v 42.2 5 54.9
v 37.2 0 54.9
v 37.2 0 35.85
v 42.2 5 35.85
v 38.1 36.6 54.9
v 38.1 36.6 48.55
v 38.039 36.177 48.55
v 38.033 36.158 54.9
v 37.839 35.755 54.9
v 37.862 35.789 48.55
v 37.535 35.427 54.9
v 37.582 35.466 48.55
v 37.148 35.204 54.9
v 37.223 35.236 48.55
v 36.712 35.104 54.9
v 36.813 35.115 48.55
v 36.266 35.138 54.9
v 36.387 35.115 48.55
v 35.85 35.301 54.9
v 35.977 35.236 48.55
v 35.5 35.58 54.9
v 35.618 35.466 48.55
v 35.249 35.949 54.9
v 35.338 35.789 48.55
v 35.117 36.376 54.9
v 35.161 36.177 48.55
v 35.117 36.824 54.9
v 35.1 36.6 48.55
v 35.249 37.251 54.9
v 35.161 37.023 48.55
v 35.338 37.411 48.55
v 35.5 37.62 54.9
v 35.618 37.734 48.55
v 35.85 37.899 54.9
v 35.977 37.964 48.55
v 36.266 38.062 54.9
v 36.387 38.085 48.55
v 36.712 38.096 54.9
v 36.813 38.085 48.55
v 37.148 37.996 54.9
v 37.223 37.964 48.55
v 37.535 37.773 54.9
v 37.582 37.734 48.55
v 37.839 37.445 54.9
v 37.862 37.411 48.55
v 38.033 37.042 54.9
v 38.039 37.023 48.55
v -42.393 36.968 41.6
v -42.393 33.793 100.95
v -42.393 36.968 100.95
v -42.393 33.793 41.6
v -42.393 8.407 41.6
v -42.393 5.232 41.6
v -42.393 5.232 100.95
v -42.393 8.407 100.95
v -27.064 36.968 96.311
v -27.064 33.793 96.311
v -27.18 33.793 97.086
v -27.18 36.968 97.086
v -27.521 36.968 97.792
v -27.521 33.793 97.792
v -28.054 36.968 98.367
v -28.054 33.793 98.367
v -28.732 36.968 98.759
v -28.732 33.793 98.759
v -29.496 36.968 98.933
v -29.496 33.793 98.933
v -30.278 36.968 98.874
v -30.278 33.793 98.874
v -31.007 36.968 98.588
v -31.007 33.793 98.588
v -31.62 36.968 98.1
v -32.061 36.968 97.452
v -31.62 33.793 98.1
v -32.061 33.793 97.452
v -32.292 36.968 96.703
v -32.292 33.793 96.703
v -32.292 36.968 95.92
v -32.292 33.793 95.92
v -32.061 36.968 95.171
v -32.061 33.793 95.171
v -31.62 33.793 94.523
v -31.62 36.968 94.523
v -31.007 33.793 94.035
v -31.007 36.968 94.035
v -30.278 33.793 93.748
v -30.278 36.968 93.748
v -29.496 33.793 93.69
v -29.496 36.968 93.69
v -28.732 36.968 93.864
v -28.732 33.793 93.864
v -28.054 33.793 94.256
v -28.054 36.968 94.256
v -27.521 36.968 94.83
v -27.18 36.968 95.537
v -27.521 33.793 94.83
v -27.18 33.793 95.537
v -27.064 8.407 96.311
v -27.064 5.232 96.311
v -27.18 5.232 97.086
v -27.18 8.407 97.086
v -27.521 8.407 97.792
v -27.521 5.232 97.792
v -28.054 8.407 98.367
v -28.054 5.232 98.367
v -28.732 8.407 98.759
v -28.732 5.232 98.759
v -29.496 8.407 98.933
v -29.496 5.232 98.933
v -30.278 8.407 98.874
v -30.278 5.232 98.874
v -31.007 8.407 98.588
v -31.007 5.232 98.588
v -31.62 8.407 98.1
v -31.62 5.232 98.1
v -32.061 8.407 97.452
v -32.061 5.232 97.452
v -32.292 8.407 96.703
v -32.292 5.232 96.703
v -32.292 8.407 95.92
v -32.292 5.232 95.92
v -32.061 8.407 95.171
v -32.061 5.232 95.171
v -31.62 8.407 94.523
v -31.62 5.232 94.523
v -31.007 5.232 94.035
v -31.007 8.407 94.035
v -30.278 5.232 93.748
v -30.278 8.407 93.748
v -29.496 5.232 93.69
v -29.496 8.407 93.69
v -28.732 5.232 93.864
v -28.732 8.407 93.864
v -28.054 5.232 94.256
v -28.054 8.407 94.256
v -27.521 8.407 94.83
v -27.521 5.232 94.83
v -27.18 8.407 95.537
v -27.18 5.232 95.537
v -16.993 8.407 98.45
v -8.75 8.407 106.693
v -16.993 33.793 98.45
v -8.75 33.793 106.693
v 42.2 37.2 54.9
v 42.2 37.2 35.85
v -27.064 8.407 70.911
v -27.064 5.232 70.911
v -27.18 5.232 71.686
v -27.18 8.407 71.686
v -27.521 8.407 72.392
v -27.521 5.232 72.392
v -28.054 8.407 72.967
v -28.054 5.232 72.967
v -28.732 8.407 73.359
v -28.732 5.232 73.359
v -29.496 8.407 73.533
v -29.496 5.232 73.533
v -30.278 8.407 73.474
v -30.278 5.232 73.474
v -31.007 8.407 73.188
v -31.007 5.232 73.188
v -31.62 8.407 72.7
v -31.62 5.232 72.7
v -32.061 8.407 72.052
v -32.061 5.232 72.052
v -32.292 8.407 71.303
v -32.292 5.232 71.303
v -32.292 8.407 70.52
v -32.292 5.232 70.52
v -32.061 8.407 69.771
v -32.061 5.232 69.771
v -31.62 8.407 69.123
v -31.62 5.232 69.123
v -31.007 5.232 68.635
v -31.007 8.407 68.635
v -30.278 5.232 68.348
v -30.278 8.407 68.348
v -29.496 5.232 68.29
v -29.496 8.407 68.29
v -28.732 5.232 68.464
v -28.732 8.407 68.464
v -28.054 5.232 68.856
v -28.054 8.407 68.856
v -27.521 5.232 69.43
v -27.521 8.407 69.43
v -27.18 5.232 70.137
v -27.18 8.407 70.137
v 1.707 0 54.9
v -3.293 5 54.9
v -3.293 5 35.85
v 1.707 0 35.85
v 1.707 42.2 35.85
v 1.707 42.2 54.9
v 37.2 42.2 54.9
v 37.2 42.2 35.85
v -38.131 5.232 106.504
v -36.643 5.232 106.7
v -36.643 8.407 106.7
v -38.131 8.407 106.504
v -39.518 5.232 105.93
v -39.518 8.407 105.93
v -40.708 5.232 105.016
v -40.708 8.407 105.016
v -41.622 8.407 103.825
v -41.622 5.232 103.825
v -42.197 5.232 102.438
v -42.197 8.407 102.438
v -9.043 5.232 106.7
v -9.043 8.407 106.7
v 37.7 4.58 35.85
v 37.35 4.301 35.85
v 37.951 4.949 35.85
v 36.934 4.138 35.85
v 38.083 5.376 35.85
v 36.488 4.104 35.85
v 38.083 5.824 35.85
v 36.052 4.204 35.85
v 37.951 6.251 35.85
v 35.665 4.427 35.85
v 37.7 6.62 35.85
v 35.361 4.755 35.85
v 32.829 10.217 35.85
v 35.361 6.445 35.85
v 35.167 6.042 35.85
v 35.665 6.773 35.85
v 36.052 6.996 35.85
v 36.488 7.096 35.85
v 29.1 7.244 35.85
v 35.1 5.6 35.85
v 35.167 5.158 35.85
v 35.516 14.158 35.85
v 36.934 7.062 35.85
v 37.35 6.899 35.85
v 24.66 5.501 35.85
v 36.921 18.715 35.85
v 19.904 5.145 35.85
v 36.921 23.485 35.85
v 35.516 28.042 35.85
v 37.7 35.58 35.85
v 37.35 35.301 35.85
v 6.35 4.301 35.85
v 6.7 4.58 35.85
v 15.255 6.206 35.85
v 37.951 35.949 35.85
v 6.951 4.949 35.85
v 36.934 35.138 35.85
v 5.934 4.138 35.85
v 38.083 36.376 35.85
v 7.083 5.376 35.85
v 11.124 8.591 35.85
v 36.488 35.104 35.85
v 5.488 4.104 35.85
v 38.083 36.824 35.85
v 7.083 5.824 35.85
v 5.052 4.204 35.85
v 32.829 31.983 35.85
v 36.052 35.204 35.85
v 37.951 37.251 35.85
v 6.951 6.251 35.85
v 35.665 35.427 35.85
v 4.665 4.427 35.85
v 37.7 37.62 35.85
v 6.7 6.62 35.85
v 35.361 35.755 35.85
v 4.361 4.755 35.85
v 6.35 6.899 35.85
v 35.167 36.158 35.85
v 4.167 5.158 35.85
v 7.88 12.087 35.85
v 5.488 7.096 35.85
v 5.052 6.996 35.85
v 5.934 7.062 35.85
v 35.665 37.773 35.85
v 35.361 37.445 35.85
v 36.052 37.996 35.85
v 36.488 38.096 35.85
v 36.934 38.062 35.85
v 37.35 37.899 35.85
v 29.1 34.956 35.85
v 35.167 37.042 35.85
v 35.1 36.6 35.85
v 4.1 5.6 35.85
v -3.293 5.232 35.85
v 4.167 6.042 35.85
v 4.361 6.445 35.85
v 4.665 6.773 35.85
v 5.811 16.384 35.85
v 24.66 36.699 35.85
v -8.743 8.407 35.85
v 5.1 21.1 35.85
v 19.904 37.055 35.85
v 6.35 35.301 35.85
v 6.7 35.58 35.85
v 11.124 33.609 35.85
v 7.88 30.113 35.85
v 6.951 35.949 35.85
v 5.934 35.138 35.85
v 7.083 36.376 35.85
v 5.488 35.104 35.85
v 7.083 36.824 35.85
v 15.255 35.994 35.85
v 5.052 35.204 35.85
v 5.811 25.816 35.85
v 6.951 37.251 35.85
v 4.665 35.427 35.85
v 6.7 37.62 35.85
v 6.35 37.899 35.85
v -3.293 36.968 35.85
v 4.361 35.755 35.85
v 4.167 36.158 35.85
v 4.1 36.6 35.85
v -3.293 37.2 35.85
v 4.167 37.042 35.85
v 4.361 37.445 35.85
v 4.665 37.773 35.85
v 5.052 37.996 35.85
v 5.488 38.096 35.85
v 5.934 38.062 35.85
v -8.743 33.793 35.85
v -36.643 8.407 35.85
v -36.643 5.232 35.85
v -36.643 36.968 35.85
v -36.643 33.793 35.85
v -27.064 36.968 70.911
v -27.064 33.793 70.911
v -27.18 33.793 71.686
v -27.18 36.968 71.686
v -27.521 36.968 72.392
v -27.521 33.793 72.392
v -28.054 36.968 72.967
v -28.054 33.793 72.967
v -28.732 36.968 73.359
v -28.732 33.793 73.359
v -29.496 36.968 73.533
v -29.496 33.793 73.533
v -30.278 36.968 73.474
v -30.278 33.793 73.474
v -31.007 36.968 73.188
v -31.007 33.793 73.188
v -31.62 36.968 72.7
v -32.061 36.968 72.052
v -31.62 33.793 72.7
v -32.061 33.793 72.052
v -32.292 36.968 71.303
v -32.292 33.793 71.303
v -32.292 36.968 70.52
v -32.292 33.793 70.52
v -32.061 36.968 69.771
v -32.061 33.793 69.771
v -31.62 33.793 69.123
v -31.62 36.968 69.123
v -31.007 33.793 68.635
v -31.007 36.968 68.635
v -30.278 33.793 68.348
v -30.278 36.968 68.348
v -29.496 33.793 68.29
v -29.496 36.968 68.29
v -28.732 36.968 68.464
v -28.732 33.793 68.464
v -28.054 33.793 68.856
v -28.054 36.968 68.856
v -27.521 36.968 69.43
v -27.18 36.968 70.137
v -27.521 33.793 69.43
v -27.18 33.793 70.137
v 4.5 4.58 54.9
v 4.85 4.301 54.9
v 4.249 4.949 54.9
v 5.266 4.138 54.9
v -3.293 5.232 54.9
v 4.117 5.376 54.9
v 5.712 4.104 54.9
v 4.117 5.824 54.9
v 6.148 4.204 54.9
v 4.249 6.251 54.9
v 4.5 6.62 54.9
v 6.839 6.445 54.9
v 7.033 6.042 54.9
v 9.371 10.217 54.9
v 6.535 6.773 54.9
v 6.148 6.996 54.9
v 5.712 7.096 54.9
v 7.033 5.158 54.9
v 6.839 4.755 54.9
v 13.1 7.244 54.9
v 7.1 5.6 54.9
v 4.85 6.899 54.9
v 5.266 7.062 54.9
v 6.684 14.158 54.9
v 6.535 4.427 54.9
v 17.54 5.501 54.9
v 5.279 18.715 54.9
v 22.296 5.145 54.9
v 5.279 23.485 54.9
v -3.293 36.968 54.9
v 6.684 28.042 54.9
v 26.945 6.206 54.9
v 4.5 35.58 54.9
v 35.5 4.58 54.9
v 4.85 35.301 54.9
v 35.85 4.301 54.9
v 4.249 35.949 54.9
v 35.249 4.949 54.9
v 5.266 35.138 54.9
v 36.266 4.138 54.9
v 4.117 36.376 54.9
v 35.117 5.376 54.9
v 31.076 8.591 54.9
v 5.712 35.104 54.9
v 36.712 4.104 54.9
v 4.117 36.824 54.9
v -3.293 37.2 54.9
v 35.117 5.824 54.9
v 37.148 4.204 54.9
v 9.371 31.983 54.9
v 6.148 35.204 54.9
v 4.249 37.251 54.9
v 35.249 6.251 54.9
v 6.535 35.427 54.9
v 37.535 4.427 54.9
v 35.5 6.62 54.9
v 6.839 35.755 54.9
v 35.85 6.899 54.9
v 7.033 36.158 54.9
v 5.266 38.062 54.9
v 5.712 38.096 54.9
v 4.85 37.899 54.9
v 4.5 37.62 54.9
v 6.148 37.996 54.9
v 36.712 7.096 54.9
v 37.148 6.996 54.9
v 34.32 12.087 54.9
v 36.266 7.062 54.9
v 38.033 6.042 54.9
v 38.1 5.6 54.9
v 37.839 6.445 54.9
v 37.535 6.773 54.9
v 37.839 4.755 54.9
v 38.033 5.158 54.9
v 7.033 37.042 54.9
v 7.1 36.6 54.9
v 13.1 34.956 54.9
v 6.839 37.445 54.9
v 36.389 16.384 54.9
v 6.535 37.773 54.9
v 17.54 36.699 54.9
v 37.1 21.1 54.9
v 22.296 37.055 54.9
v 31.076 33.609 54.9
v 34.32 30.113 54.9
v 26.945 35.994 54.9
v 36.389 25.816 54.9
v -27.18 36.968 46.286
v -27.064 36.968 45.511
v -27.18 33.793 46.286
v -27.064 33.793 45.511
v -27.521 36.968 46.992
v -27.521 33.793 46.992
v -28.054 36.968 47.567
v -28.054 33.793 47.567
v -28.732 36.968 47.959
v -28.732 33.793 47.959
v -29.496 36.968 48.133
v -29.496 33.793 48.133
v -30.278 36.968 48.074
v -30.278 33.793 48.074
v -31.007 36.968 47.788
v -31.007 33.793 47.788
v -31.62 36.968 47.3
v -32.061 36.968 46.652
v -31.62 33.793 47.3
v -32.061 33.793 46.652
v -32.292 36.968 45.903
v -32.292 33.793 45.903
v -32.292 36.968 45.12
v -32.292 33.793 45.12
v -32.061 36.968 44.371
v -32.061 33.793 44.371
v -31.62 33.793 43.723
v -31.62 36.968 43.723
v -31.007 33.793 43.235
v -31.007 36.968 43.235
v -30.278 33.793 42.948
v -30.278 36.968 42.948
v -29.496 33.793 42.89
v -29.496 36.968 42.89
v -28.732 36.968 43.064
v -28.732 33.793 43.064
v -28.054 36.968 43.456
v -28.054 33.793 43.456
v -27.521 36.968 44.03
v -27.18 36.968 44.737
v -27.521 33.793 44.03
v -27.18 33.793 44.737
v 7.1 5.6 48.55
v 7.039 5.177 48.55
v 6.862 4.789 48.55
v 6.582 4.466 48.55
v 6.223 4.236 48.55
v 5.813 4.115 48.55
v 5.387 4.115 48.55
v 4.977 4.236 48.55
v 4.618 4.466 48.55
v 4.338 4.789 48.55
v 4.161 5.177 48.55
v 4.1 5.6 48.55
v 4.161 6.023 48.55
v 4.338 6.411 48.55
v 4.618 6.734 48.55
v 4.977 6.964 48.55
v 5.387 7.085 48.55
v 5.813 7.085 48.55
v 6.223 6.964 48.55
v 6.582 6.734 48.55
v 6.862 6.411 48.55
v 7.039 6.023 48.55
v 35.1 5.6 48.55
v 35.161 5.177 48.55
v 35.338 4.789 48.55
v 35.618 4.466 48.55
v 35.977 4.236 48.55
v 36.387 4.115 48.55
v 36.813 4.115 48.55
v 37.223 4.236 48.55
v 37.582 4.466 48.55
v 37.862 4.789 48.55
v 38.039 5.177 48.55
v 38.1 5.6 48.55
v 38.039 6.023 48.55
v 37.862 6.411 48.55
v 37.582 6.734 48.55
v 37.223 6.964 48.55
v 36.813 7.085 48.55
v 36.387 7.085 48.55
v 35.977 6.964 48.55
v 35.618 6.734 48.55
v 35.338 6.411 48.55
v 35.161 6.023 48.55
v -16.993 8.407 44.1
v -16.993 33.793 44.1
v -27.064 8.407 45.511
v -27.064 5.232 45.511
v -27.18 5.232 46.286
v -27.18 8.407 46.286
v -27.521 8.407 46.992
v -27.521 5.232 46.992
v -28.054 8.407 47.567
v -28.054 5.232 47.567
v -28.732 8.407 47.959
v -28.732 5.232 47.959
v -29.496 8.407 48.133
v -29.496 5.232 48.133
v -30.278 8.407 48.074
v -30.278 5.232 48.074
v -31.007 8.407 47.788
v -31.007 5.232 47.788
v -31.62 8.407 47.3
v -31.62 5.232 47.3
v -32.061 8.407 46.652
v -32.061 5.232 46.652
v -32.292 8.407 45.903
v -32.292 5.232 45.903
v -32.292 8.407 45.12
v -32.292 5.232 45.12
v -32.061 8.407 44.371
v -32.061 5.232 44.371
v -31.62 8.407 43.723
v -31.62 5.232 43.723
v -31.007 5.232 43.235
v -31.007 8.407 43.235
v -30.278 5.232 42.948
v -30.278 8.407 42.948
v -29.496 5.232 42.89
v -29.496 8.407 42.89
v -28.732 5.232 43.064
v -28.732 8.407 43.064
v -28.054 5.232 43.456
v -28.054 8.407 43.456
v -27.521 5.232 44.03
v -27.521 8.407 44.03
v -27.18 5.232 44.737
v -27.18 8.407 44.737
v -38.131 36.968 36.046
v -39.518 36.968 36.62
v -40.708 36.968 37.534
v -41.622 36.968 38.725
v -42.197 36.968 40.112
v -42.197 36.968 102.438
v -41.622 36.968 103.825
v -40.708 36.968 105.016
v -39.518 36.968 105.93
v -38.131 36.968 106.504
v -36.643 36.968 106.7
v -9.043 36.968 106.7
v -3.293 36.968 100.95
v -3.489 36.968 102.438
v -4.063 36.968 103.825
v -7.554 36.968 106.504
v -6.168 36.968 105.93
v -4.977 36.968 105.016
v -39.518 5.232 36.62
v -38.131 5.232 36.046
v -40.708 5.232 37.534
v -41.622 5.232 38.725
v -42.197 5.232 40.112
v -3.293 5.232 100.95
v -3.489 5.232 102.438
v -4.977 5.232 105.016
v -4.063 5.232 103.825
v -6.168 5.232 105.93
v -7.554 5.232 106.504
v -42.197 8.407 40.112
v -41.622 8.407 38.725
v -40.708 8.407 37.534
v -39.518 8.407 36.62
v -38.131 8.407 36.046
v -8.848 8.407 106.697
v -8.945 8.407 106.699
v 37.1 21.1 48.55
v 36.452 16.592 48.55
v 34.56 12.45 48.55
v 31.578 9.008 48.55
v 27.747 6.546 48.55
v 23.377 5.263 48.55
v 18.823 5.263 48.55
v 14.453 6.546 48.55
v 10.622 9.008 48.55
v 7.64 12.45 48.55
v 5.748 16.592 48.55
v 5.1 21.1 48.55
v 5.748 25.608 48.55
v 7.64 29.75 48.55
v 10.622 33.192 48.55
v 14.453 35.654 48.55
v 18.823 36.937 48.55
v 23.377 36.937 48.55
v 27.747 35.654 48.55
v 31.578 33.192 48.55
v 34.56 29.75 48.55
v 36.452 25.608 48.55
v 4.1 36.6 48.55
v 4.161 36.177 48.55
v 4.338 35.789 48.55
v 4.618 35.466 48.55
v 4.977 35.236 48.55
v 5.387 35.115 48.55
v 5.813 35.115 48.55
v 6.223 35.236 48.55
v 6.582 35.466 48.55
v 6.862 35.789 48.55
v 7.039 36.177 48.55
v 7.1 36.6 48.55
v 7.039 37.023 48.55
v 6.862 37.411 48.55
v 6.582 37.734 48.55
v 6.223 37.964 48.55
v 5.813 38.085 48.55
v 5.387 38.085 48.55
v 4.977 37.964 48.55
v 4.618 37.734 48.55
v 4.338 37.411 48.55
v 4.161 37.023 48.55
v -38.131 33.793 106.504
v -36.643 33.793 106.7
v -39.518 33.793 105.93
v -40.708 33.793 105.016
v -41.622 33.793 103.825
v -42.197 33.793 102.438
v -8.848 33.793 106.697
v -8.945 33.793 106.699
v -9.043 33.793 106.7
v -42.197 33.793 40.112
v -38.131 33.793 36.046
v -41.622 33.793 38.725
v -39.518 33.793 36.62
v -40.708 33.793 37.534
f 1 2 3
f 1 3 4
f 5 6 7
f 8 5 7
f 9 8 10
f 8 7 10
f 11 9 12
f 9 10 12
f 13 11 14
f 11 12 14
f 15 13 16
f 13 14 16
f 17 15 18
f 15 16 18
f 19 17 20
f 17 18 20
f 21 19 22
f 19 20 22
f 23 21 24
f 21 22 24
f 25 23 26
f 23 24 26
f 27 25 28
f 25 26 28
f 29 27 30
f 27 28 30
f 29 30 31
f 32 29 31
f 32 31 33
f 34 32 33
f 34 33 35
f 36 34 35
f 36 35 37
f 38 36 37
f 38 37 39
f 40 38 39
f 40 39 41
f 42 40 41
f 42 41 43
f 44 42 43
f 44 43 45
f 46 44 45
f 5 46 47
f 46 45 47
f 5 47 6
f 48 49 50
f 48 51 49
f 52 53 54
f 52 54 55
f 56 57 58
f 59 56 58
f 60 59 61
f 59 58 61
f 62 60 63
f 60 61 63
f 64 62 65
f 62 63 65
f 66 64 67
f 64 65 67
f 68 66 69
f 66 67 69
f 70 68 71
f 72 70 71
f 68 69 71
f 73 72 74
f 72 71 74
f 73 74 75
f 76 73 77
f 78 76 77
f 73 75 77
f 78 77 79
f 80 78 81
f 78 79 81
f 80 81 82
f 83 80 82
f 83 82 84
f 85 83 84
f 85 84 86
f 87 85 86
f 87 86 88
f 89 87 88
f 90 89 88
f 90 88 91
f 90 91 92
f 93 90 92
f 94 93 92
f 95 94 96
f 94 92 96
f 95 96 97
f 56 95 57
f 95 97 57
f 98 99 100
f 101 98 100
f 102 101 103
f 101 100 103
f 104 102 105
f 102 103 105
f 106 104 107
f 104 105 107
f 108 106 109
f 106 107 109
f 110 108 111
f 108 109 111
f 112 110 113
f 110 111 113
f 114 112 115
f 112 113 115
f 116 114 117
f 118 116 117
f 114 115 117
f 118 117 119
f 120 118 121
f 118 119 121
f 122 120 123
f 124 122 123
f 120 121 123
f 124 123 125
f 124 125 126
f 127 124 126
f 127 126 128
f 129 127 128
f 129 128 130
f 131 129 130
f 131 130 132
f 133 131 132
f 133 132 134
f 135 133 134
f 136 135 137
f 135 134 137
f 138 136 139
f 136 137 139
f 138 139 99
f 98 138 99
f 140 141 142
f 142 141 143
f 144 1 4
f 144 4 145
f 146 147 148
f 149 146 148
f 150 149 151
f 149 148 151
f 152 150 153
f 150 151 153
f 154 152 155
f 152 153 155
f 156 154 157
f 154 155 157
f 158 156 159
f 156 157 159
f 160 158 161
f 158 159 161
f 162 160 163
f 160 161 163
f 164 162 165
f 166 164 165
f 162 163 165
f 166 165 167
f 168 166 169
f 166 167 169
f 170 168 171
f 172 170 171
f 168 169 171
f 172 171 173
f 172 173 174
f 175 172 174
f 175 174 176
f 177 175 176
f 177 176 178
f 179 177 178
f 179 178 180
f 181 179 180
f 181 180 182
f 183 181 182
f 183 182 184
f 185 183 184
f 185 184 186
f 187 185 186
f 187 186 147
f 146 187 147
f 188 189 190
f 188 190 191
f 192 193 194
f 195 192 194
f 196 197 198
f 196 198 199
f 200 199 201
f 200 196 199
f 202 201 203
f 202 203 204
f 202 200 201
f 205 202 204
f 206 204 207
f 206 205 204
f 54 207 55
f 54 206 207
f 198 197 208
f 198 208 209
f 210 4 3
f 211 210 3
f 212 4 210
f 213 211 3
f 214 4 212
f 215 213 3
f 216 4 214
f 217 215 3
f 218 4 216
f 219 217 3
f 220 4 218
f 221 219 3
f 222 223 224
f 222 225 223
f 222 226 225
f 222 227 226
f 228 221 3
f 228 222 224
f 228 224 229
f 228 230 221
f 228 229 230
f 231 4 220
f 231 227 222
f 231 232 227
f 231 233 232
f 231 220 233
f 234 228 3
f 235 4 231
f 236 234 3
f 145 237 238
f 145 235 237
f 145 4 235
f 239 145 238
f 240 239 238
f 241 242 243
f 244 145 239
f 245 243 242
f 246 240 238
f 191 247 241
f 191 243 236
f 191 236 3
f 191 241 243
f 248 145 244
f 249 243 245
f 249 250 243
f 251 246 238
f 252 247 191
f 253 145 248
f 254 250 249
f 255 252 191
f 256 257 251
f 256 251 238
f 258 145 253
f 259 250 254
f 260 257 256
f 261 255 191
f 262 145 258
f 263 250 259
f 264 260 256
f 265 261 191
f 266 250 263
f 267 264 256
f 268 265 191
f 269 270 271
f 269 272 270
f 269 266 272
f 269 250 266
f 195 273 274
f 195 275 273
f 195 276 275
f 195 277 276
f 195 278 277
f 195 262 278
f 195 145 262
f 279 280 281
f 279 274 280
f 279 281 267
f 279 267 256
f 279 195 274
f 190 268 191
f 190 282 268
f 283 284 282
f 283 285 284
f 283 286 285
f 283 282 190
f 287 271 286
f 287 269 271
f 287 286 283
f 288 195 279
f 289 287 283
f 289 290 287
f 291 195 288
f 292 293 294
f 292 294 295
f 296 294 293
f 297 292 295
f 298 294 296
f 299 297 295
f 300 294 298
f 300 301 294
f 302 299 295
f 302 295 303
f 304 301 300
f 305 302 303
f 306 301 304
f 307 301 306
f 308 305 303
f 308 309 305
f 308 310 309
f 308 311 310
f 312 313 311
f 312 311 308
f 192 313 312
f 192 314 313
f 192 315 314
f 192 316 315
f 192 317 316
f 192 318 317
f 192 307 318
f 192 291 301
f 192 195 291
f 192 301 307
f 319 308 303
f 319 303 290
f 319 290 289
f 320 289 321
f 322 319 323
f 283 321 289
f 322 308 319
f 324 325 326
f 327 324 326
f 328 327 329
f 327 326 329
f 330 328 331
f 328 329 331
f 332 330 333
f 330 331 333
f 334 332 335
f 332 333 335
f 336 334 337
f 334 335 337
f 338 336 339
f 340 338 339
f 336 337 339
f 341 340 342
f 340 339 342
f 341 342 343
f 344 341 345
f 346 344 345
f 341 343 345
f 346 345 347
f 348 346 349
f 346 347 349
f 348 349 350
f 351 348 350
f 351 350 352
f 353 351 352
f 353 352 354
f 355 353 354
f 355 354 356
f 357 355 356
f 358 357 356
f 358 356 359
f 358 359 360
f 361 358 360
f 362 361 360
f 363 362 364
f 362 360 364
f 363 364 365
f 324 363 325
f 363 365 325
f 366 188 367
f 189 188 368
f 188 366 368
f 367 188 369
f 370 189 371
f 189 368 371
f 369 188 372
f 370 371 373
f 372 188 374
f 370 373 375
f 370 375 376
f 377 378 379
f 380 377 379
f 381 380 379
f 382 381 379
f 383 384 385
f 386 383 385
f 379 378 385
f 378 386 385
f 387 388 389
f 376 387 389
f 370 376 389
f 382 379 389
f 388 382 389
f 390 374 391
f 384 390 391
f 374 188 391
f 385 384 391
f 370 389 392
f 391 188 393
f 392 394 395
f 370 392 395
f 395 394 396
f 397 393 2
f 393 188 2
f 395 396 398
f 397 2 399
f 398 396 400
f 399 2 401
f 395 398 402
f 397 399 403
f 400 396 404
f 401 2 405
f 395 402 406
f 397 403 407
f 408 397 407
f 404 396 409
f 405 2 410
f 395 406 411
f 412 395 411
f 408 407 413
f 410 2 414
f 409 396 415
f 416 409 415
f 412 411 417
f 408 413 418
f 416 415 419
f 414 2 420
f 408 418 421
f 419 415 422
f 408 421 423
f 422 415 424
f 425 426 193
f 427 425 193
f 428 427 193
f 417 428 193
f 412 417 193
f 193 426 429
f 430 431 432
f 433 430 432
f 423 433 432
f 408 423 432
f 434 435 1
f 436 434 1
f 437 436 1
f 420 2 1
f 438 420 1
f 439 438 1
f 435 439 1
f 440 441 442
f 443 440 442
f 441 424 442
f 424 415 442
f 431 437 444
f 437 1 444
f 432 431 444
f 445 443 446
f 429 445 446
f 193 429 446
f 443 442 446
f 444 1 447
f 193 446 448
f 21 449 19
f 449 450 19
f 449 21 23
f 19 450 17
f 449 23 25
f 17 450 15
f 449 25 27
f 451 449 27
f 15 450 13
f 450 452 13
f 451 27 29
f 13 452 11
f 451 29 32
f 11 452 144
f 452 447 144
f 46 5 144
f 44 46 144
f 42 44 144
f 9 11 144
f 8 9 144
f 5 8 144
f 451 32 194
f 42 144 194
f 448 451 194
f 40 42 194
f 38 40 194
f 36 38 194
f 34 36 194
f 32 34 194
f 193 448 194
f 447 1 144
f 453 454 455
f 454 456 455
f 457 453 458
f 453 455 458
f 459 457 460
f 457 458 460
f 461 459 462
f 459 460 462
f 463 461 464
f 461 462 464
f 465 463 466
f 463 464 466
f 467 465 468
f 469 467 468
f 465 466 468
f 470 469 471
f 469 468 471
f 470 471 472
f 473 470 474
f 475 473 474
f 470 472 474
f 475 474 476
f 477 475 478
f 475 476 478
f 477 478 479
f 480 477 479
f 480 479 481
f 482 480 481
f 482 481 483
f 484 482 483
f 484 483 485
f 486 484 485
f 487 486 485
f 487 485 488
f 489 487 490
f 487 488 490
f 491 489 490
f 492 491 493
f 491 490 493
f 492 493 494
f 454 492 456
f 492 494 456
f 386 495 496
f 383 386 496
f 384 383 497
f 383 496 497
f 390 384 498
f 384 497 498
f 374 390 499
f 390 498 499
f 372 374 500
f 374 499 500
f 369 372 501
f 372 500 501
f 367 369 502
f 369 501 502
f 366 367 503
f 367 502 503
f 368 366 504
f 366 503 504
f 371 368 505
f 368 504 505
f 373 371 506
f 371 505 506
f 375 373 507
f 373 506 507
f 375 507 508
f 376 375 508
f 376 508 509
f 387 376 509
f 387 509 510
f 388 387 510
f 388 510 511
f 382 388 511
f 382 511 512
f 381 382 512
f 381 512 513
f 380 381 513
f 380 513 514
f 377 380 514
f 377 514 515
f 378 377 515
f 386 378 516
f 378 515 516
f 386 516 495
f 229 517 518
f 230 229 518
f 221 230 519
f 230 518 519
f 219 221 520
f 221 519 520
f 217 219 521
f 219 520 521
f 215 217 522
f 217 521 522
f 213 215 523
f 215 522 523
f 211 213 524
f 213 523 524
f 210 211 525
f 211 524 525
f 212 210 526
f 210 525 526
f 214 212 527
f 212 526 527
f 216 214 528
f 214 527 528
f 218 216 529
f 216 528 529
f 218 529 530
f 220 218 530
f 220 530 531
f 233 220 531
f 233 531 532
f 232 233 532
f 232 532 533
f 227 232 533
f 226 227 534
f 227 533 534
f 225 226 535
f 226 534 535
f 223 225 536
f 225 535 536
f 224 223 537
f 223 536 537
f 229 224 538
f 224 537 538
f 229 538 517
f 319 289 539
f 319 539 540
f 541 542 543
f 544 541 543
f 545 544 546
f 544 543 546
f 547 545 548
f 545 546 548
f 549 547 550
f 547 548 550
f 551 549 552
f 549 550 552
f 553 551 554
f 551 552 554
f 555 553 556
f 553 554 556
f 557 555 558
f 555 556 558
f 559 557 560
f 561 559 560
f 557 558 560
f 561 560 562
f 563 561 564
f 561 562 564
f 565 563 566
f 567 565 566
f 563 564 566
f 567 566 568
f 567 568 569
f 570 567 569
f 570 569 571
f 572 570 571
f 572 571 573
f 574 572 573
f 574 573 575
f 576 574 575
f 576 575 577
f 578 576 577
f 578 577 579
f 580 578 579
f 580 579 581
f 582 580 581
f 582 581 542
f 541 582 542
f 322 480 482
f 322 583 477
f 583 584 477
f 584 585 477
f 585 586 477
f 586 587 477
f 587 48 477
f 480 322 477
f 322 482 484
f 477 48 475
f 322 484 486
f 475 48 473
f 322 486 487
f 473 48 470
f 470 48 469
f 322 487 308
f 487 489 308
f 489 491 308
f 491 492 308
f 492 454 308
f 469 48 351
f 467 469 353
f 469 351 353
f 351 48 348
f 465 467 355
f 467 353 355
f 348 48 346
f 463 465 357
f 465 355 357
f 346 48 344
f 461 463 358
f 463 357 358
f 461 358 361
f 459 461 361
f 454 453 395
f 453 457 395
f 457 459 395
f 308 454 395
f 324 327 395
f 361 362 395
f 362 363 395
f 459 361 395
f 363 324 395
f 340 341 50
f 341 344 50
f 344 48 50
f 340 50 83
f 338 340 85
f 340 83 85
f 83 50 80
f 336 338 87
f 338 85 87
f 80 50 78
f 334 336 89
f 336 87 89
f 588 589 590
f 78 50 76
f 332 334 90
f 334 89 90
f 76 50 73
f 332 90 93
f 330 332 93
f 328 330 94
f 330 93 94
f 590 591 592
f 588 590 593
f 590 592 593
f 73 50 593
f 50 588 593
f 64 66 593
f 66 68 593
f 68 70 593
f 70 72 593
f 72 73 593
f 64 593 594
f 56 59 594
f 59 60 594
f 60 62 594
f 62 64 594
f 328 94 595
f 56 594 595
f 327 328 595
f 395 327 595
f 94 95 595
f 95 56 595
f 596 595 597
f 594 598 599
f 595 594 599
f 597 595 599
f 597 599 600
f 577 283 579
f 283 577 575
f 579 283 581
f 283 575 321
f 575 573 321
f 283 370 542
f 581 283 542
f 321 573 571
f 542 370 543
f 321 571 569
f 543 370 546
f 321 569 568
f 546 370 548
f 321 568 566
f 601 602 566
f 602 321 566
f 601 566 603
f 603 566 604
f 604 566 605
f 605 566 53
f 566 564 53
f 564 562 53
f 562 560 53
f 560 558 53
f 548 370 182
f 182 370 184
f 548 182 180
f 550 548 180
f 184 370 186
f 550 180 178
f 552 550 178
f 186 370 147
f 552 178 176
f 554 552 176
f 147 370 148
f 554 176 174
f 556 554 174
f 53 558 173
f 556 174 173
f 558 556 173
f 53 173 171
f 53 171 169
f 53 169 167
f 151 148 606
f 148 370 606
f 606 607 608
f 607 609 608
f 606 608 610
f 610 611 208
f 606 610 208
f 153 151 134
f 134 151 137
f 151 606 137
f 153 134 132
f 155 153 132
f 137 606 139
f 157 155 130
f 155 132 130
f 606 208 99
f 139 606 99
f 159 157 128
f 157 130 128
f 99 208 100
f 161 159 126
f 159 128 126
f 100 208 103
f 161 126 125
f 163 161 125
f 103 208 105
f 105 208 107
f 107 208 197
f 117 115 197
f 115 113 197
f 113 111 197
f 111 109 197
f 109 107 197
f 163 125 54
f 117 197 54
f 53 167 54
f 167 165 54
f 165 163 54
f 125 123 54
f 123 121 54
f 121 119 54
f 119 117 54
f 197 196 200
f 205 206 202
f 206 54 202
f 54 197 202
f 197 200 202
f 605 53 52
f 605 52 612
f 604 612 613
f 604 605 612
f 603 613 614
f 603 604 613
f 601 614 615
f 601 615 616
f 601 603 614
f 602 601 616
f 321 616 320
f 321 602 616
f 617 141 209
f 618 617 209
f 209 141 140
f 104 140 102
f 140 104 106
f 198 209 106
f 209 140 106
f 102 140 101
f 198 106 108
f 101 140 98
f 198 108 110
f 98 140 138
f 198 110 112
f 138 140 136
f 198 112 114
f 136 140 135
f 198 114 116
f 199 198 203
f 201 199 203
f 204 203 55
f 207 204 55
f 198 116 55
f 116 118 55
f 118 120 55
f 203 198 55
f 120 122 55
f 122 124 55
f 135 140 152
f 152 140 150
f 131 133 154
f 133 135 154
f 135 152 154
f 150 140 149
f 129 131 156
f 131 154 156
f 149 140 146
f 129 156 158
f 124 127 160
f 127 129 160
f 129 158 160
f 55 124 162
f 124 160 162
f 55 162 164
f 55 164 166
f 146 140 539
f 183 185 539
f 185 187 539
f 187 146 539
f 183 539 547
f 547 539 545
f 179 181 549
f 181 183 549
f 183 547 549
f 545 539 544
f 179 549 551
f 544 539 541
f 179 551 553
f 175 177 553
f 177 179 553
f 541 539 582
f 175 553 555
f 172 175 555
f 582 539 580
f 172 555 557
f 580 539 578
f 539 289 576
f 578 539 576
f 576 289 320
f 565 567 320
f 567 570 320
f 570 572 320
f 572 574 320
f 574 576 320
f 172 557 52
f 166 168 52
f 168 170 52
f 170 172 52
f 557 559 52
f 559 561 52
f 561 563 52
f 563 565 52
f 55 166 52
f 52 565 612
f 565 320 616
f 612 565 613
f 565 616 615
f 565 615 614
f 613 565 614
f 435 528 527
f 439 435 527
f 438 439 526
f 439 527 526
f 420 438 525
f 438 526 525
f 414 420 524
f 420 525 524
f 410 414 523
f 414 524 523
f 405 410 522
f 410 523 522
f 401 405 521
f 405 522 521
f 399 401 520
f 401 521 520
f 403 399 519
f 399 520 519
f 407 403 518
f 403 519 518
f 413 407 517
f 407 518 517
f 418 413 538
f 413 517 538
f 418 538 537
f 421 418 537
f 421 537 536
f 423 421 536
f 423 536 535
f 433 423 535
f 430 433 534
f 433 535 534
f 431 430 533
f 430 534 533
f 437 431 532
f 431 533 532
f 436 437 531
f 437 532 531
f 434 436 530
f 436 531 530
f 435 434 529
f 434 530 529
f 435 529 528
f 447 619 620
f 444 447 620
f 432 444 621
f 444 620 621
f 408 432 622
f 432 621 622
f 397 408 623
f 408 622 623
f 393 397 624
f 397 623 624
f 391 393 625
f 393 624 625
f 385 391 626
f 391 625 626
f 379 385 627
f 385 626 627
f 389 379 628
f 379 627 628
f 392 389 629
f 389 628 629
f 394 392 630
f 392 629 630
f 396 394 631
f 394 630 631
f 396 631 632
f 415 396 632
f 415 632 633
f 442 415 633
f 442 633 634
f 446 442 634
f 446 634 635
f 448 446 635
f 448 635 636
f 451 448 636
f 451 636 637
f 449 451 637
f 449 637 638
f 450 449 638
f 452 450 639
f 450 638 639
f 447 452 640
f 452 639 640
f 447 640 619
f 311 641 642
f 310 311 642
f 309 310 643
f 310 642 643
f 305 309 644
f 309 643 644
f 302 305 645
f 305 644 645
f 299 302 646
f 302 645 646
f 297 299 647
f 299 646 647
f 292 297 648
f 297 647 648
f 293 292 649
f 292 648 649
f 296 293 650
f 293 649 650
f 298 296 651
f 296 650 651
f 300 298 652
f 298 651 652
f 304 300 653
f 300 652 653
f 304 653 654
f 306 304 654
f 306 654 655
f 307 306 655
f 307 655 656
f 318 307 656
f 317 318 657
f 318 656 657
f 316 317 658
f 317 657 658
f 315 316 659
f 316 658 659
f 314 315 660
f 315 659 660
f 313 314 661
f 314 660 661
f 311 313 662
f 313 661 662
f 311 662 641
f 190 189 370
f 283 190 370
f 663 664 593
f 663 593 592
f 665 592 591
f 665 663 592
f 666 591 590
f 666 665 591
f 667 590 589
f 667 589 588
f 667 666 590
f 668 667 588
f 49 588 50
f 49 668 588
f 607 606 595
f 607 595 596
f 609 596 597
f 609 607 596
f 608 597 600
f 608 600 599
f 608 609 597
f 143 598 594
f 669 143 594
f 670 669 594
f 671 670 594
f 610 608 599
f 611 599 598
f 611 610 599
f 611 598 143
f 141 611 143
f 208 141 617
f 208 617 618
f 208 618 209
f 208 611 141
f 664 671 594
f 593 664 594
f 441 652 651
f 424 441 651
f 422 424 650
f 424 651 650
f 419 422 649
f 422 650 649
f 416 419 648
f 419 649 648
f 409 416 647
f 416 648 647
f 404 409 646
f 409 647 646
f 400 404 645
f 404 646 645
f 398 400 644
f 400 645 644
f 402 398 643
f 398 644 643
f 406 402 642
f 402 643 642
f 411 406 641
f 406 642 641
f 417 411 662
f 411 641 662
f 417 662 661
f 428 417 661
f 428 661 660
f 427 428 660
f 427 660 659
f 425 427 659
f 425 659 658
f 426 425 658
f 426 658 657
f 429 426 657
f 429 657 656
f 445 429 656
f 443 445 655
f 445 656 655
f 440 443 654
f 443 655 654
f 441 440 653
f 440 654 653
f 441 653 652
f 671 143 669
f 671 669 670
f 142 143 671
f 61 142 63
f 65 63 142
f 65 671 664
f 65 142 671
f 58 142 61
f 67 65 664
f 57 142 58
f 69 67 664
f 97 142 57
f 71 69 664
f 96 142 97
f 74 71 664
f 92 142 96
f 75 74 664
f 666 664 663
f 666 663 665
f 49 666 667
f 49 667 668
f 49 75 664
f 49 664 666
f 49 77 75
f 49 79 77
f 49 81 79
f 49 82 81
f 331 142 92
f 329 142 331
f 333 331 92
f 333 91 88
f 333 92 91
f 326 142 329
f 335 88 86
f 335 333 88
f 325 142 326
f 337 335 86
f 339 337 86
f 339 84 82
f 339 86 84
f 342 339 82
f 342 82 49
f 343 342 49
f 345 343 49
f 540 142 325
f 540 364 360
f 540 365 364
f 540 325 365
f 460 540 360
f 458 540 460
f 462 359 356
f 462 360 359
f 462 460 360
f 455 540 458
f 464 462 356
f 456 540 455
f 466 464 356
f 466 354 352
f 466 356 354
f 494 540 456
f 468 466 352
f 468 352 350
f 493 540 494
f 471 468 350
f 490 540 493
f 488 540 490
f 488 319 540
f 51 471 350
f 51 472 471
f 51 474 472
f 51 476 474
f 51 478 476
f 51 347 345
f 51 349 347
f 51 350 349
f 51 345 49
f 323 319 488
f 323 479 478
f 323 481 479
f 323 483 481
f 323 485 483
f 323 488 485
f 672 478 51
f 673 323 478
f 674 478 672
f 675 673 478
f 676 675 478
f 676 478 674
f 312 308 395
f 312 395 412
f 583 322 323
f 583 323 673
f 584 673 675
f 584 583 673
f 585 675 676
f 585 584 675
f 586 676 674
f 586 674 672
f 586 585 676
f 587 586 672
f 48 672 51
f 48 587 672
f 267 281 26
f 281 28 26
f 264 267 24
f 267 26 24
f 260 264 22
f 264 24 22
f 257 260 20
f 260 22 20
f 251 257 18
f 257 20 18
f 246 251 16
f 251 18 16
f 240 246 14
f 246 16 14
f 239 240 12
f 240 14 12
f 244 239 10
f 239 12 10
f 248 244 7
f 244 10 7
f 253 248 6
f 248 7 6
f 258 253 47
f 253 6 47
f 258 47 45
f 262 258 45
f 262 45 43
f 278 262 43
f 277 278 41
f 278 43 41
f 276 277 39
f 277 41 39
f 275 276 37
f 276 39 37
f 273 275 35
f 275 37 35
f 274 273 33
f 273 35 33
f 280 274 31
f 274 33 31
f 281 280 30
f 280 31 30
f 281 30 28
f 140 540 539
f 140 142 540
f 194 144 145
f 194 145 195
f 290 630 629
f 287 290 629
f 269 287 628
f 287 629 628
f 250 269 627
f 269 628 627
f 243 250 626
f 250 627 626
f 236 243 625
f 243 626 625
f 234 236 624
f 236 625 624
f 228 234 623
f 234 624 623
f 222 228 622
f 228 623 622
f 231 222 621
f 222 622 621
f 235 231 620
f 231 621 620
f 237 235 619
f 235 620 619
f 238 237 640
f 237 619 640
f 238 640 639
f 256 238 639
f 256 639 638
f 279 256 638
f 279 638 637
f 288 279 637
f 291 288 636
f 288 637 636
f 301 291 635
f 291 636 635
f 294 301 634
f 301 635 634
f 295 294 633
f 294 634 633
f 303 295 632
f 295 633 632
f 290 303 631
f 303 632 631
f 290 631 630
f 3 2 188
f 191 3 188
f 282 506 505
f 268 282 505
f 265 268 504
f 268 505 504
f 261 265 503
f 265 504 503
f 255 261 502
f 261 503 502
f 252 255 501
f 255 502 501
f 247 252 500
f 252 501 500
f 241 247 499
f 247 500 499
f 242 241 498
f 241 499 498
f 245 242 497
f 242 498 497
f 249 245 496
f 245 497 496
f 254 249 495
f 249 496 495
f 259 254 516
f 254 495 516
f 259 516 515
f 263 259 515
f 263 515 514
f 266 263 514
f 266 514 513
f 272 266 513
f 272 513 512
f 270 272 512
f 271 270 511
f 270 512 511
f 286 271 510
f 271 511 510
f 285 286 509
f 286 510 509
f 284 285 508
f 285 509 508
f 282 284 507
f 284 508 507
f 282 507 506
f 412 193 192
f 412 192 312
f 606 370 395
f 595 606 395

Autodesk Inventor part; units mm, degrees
ref_plane "YZ Plane" through (0, 0, 0) normal (1, 0, 0) x (0, 1, 0)
ref_plane "XZ Plane" through (0, 0, 0) normal (0, 1, 0) x (-1, 0, 0)
ref_plane "XY Plane" through (0, 0, 0) normal (0, 0, 1) x (1, 0, 0)
sketch "Sketch1" plane through (0, 0, 0) normal (0, 0, 1) x (1, 0, 0)
  line L0 (0, 37.2) -> (5, 42.2)
  line L1 (37.2, 42.2) -> (42.2, 37.2)
  line L2 (42.2, 5) -> (37.2, 0)
  line L3 (5, 0) -> (0, 5)
  line L4 (0, 37.2) -> (0, 5)
  line L5 (37.2, 42.2) -> (5, 42.2)
  line L6 (42.2, 5) -> (42.2, 37.2)
  line L7 (5, 0) -> (37.2, 0)
  line L8 (0, 5) -> (0, 0)
  circle A0 centre (21.1, 21.1) radius 2.5
  circle A1 centre (5.6, 36.6) radius 1.5
  circle A2 centre (36.6, 36.6) radius 1.5
  circle A3 centre (36.6, 5.6) radius 1.5
  circle A4 centre (5.6, 5.6) radius 1.5
  dimension "d8" = 5
  dimension "d9" = 5
  dimension "d10" = 5
  dimension "d11" = 21.1
  dimension "d12" = 21.1
  dimension "d13" = 3
  dimension "d14" = 3
  dimension "d15" = 3
  dimension "d16" = 3
  dimension "d17" = 31
  dimension "d18" = 31
  dimension "d19" = 31
  dimension "d20" = 31
  dimension "d21" = 5.6
  dimension "d22" = 5.6
  dimension "d43" = 5.6
  dimension "d44" = 5.6
  dimension "d45" = 5.6
  dimension "d46" = 5.6
  dimension "d47" = 42.2
extrude "Extrusion1" add sketch "Sketch1" along normal blind 9.8
sketch "Sketch2" plane through (0, 0, 9.8) normal (0, 0, 1) x (1, 0, 0)
  circle A0 centre (21.1, 21.1) radius 2.5 projected
  circle A1 centre (5.6, 5.6) radius 1.5 projected
  circle A2 centre (36.6, 5.6) radius 1.5 projected
  circle A3 centre (36.6, 36.6) radius 1.5 projected
  circle A4 centre (5.6, 36.6) radius 1.5 projected
  line L0 (5, 42.2) -> (0, 37.2) projected
  line L1 (0, 37.2) -> (0, 5) projected
  line L2 (0, 5) -> (5, 0) projected
  line L3 (5, 0) -> (37.2, 0) projected
  line L4 (37.2, 0) -> (42.2, 5) projected
  line L5 (42.2, 5) -> (42.2, 37.2) projected
  line L6 (42.2, 37.2) -> (37.2, 42.2) projected
  line L7 (37.2, 42.2) -> (5, 42.2) projected
  point P0 (0, 0)
fillet "Fillet1" radius 0.25 8 edges at (21.1, 42.2, 9.8) (39.7, 39.7, 9.8) (42.2, 21.1, 9.8) (39.7, 2.5, 9.8) (21.1, 0, 9.8) (2.5, 2.5, 9.8) (0, 21.1, 9.8) (2.5, 39.7, 9.8)
extrude "Extrusion2" add sketch "Sketch2" along normal blind 31
sketch "Sketch3" plane through (0, 0, 40.8) normal (0, 0, 1) x (1, 0, 0)
  circle A0 centre (21.1, 21.1) radius 2.5 projected
  circle A1 centre (5.6, 36.6) radius 1.5 projected
  circle A2 centre (36.6, 36.6) radius 1.5 projected
  circle A3 centre (36.6, 5.6) radius 1.5 projected
  circle A4 centre (5.6, 5.6) radius 1.5 projected
  line L0 (5, 42.2) -> (0, 37.2) projected
  line L1 (0, 37.2) -> (0, 5) projected
  line L2 (0, 5) -> (5, 0) projected
  line L3 (5, 0) -> (37.2, 0) projected
  line L4 (37.2, 0) -> (42.2, 5) projected
  line L5 (42.2, 5) -> (42.2, 37.2) projected
  line L6 (42.2, 37.2) -> (37.2, 42.2) projected
  line L7 (37.2, 42.2) -> (5, 42.2) projected
  point P0 (0, 0)
fillet "Fillet2" radius 0.25 8 edges at (21.1, 42.2, 40.8) (39.7, 39.7, 40.8) (42.2, 21.1, 40.8) (39.7, 2.5, 40.8) (21.1, 0, 40.8) (2.5, 2.5, 40.8) (0, 21.1, 40.8) (2.5, 39.7, 40.8)
extrude "Extrusion3" add sketch "Sketch3" along normal blind 7.75
sketch "Sketch4" plane through (0, 0, 48.55) normal (0, 0, 1) x (1, 0, 0)
  circle A0 centre (21.1, 21.1) radius 2.5 projected
  circle A1 centre (21.1, 21.1) radius 16
  point P0 (0, 0)
  dimension "d31" = 32
extrude "Extrusion4" cut sketch "Sketch4" against normal blind 0.6
sketch "Sketch5" plane through (21.1, 21.1, 47.95) normal (0, 0, 1) x (1, 0, 0)
  circle A0 centre (0, 0) radius 2.5 projected
  circle A1 centre (0, 0) radius 16 projected
  circle A2 centre (0, 0) radius 11
  point P0 (-21.1, -21.1)
  dimension "d35" = 22
extrude "Extrusion5" add sketch "Sketch5" along normal blind 2.2 contours A2
fillet "Fillet3" radius 0.5 1 edges at (10.1, 21.1, 50.15)
sketch "Sketch6" plane through (21.1, 21.1, 50.15) normal (0, 0, 1) x (1, 0, 0)
  circle A0 centre (0, 0) radius 2.5 projected
  point P0 (-21.1, -21.1)
extrude "Extrusion6" add sketch "Sketch6" along normal blind 22.5
fillet "Fillet4" radius 0.5 1 edges at (18.6, 21.1, 72.65)
sketch "Sketch7" plane through (0, 0, 48.55) normal (0, 0, 1) x (1, 0, 0)
  circle A0 centre (21.1, 21.1) radius 16 projected
  circle A1 centre (5.6, 5.6) radius 1.5 projected
  circle A2 centre (36.6, 5.6) radius 1.5 projected
  circle A3 centre (36.6, 36.6) radius 1.5 projected
  circle A4 centre (5.6, 36.6) radius 1.5 projected
  line L0 (5, 42.2) -> (0, 37.2) projected
  line L1 (0, 37.2) -> (0, 5) projected
  line L2 (0, 5) -> (5, 0) projected
  line L3 (5, 0) -> (37.2, 0) projected
  line L4 (37.2, 0) -> (42.2, 5) projected
  line L5 (42.2, 5) -> (42.2, 37.2) projected
  line L6 (42.2, 37.2) -> (37.2, 42.2) projected
  line L7 (37.2, 42.2) -> (5, 42.2) projected
  point P0 (0, 0)
extrude "Extrusion7" add sketch "Sketch7" along normal blind 6.35
sketch "Sketch8" plane through (5, 0, 40.8) normal (0, -1, 0) x (1, 0, 0)
  point P0 (-5, -40.8)
sketch "Sketch9" plane through (5, 0, 40.8) normal (0, -1, 0) x (1, 0, 0)
  line L0 (0, 14.1) -> (-5, 14.1) projected
  line L1 (37.2, 0) -> (37.2, 14.1) projected
  line L2 (-5, 14.1) -> (37.2, 14.1)
  line L3 (37.2, 14.1) -> (37.2, 7.75)
  line L4 (37.2, 7.75) -> (-5, 7.75)
  line L5 (-5, 7.75) -> (-5, 14.1)
  line L6 (-5, 7.75) -> (48.466, 7.75)
  line L7 (48.466, 7.75) -> (48.466, -59.7117)
  line L8 (48.466, -59.7117) -> (-5, -59.7117)
  line L9 (-5, -59.7117) -> (-5, 7.75)
  point P0 (-5, -40.8)
  dimension "d50" = 6.35
extrude "Extrusion8" cut sketch "Sketch9" against normal blind 98.4 contours L4 L6 L7 L8 L9
sketch "Sketch10" plane through (21.1, 21.1, 48.55) normal (0, 0, -1) x (-1, 0, 0)
  circle A0 centre (0, 0) radius 11 projected
  circle A1 centre (0, 0) radius 2.5 projected
  circle A2 centre (0, 0) radius 2.5 projected
  point P0 (21.1, -21.1)
extrude "Extrusion9" cut sketch "Sketch10" against normal blind 76.85 contours A0 | A1
sketch "Sketch11" plane through (0, 5, 54.9) normal (-1, 0, 0) x (0, 0, 1)
  line L0 (-6.35, -5) -> (-6.35, 0) projected
  line L1 (0, 37.2) -> (-6.35, 37.2)
  line L2 (-6.35, 37.2) -> (-6.35, -5)
  line L3 (-6.35, -5) -> (0, -5)
  line L4 (0, -5) -> (0, 37.2)
  point P0 (-54.9, -5)
extrude "Extrusion10" add sketch "Sketch11" along normal blind 16.9926
sketch "Sketch12" plane through (0, 5, 54.9) normal (1, 0, 0) x (0, 0, -1)
  line L0 (6.35, 32.2) -> (0, 32.2) projected
  line L1 (6.35, 37.2) -> (6.35, 32.2) projected
  line L2 (0, 37.2) -> (6.35, 37.2) projected
  line L3 (0, 32.2) -> (0, 37.2) projected
  line L4 (6.35, 0) -> (0, 0) projected
  line L5 (0, -5) -> (0, 0) projected
  line L6 (6.35, -5) -> (0, -5) projected
  line L7 (6.35, 0) -> (6.35, -5) projected
  point P0 (54.9, -5)
extrude "Extrusion11" add sketch "Sketch12" along normal blind 3.9926
sketch "Sketch13" plane through (3.9926, 5, 54.9) normal (1, 0, 0) x (0, 0, -1)
  line L0 (6.35, 36.1926) -> (0, 36.1926) projected
  line L1 (6.35, 36.1926) -> (6.35, 37.2) projected
  line L2 (6.35, 37.2) -> (0, 37.2) projected
  line L3 (0, 37.2) -> (0, 36.1926) projected
  line L4 (0, -3.9926) -> (6.35, -3.9926) projected
  line L5 (0, -3.9926) -> (0, -5) projected
  line L6 (0, -5) -> (6.35, -5) projected
  line L7 (6.35, -5) -> (6.35, -3.9926) projected
  point P0 (54.9, -5)
extrude "Extrusion12" add sketch "Sketch13" along normal blind 3.9926
sketch "Sketch14" plane through (-16.9926, 5, 54.9) normal (-1, 0, 0) x (0, 0, 1)
  line L0 (0, -5) -> (0, 0) projected
  line L1 (-6.35, 0) -> (-6.35, 32.2) projected
  line L2 (0, -5) -> (-6.35, -5)
  line L3 (-6.35, -5) -> (-6.35, 3.4074)
  line L4 (-6.35, 3.4074) -> (0, 3.4074)
  line L5 (0, 3.4074) -> (0, -5)
  line L6 (-6.35, 37.2) -> (0, 37.2) projected
  line L7 (0, 37.2) -> (-6.35, 37.2)
  line L8 (-6.35, 37.2) -> (-6.35, 28.7926)
  line L9 (-6.35, 28.7926) -> (0, 28.7926)
  line L10 (0, 28.7926) -> (0, 37.2)
  point P0 (-54.9, -5)
  point P1 (-3.175, 28.7926)
  dimension "d61" = 8.4074
  dimension "d62" = 8.4074
extrude "Extrusion13" add sketch "Sketch14" along normal blind 25.4
sketch "Sketch15" plane through (-42.3926, 5, 54.9) normal (-1, 0, 0) x (0, 0, 1)
  line L0 (0, 3.4074) -> (-6.35, 3.4074)
  line L1 (-6.35, 3.4074) -> (-6.35, 0.2324)
  line L2 (-6.35, 0.2324) -> (0, 0.2324)
  line L3 (0, 0.2324) -> (0, 3.4074)
  line L4 (0, 37.2) -> (-6.35, 37.2) projected
  line L5 (-6.35, 37.2) -> (0, 37.2) construction
  line L6 (0, 37.2) -> (-6.35, 37.2) projected
  line L7 (-6.35, 37.2) -> (0, 37.2) projected
  line L8 (0, -5) -> (0, 3.4074) projected
  line L9 (0, 3.4074) -> (-6.35, 3.4074) projected
  line L10 (-6.35, 3.4074) -> (-6.35, -5) projected
  line L11 (-6.35, -5) -> (0, -5) projected
  line L12 (0, 28.7926) -> (0, 37.2) projected
  line L13 (-6.35, 37.2) -> (-6.35, 28.7926) projected
  line L14 (0, 28.7926) -> (-6.35, 28.7926)
  line L15 (-6.35, 28.7926) -> (-6.35, 31.9676)
  line L16 (-6.35, 31.9676) -> (0, 31.9676)
  line L17 (0, 31.9676) -> (0, 28.7926)
  line L18 (0, 37.2) -> (-6.35, 37.2) projected
  line L19 (-6.35, 37.2) -> (-6.35, 28.7926) projected
  line L20 (-6.35, 28.7926) -> (0, 28.7926) projected
  line L21 (0, 28.7926) -> (0, 37.2) projected
  point P0 (-54.9, -5)
  point P1 (0, 31.9676)
  point P2 (0, 0.2324)
  point P3 (-6.35, 0.2324)
  dimension "d66" = 3.175
  dimension "d68" = 3.175
extrude "Extrusion14" cut sketch "Sketch15" against normal blind 39.1 contours L8 L11 L10 L2 | L12 L16 L13 L4
chamfer "Chamfer1" distance 5 angle 45 2 edges at (-3.2926, 0, 51.725) (-3.2926, 42.2, 51.725)
sketch "Sketch16" plane through (42.2, 5, 48.55) normal (0, 0, -1) x (-1, 0, 0)
  point P0 (42.2, -5)
sketch "Sketch17" plane through (0, 0, 54.9) normal (0, 0, 1) x (1, 0, 0)
  line L0 (-3.2926, 36.9676) -> (-42.3926, 36.9676) projected
  line L1 (-42.3926, 5.2324) -> (-3.2926, 5.2324) projected
  line L2 (-3.2926, 36.9676) -> (-16.9772, 36.9676)
  line L3 (-16.9772, 36.9676) -> (-16.9772, 5.2324)
  line L4 (-16.9772, 5.2324) -> (-3.2926, 5.2324)
  line L5 (-3.2926, 5.2324) -> (-3.2926, 36.9676)
  point P0 (0, 0)
extrude "Extrusion15" add sketch "Sketch17" along normal blind 39.1
sketch "Sketch18" plane through (42.2, 5, 48.55) normal (0, 0, -1) x (-1, 0, 0)
  line L0 (59.1926, 3.4074) -> (59.1926, 28.7926) projected
  line L1 (84.5926, 0.2324) -> (84.5926, 3.4074) projected
  line L2 (59.1926, 3.4074) -> (84.5926, 3.4074)
  line L3 (84.5926, 3.4074) -> (84.5926, 0.2324)
  line L4 (84.5926, 0.2324) -> (59.1926, 0.2324)
  line L5 (59.1926, 0.2324) -> (59.1926, 3.4074)
  line L6 (59.1926, 28.7926) -> (84.5926, 28.7926) projected
  line L7 (59.1926, 32.131) -> (84.5926, 32.131)
  line L8 (84.5926, 32.131) -> (84.5926, 28.7926)
  line L9 (84.5926, 28.7926) -> (59.1926, 28.7926)
  line L10 (59.1926, 28.7926) -> (59.1926, 32.131)
  point P0 (42.2, -5)
extrude "Extrusion16" add sketch "Sketch18" along normal blind 12.7
sketch "Sketch19" plane through (42.2, 5, 48.55) normal (0, 0, 1) x (1, 0, 0)
  line L0 (-84.5926, 31.9676) -> (-57.74, 31.9676)
  line L1 (-57.74, 31.9676) -> (-57.74, 35.8031)
  line L2 (-57.74, 35.8031) -> (-84.5926, 35.8031)
  line L3 (-84.5926, 35.8031) -> (-84.5926, 31.9676)
  point P0 (-42.2, -5)
extrude "Extrusion17" cut sketch "Sketch19" against normal blind 25.8
sketch "Sketch20" plane through (0, 0, 94) normal (0, 0, 1) x (1, 0, 0)
  line L0 (-3.2926, 36.9676) -> (-16.9772, 36.9676) projected
  line L1 (-16.9772, 36.9676) -> (-16.9772, 5.2324) projected
  line L2 (-16.9772, 5.2324) -> (-3.2926, 5.2324) projected
  line L3 (-3.2926, 5.2324) -> (-3.2926, 36.9676) projected
  point P0 (0, 0)
extrude "Extrusion18" add sketch "Sketch20" along normal blind 12.7
sketch "Sketch21" plane through (0, 0, 54.9) normal (0, 0, 1) x (1, 0, 0)
  line L0 (-16.9772, 5.2324) -> (-16.9772, 36.9676) projected
  line L1 (-16.9772, 36.9676) -> (-42.3926, 36.9676) projected
  line L2 (-42.3926, 33.7926) -> (-42.3926, 36.9676) projected
  line L3 (-16.9926, 33.7926) -> (-42.3926, 33.7926) projected
  line L4 (-16.9926, 8.4074) -> (-16.9926, 33.7926) projected
  line L5 (-16.9926, 8.4074) -> (-42.3926, 8.4074) projected
  line L6 (-42.3926, 5.2324) -> (-42.3926, 8.4074) projected
  line L7 (-42.3926, 5.2324) -> (-16.9772, 5.2324) projected
  point P0 (0, 0)
extrude "Extrusion19" add sketch "Sketch21" along normal blind 51.95
sketch "Sketch22" plane through (-16.9772, 5.2324, 106.7) normal (1, 0, 0) x (0, 0, -1)
  line L0 (0, 0) -> (-13.0158, 0)
  line L1 (-13.0158, 0) -> (-13.0158, 37.0534)
  line L2 (-13.0158, 37.0534) -> (0, 37.0534)
  line L3 (0, 37.0534) -> (0, 0)
  point P0 (106.7, -5.2324)
extrude "Extrusion20" cut sketch "Sketch22" against normal blind 71.05
sketch "Sketch23" plane through (-3.2926, 5.2324, 48.55) normal (0, -1, 0) x (1, 0, 0)
  line L0 (-13.7, -12.7) -> (-39.1, -12.7) projected
  line L1 (-26.4, -12.7) -> (-26.4, 58.15)
  line L2 (0, 58.15) -> (-39.1, 58.15) projected
  line L3 (-26.4, 58.15) -> (-26.4, 47.7614)
  circle A0 centre (-26.4, 47.7614) radius 2.6289
  line L4 (-26.4, 47.7614) -> (-26.4, 22.3614)
  line L5 (-26.4, 22.3614) -> (-26.4, -3.0386)
  circle A1 centre (-26.4, 22.3614) radius 2.6289
  circle A2 centre (-26.4, -3.0386) radius 2.6289
  point P0 (3.2926, -48.55)
  dimension "d86" = 10.3886
  dimension "d87" = 5.2578
  dimension "d88" = 25.4
  dimension "d89" = 25.4
  dimension "d90" = 5.2578
  dimension "d91" = 5.2578
extrude "Extrusion21" cut sketch "Sketch23" against normal blind 133.45
sketch "Sketch24" plane through (0, 0, 106.7) normal (0, 0, 1) x (1, 0, 0)
  line L0 (-3.2926, 5.2324) -> (-42.3926, 5.2324) projected
  line L1 (-3.2926, 36.9676) -> (-9.6426, 36.9676)
  line L2 (-9.6426, 36.9676) -> (-9.6426, 5.2324)
  line L3 (-9.6426, 5.2324) -> (-3.2926, 5.2324)
  line L4 (-3.2926, 5.2324) -> (-3.2926, 36.9676)
  point P0 (0, 0)
  dimension "d95" = 6.35
extrude "Extrusion22" add sketch "Sketch24" along normal blind 6.35
sketch "Sketch25" plane through (-3.2926, 5.2324, 48.55) normal (0, -1, 0) x (1, 0, 0)
  line L0 (-6.35, 58.15) -> (-6.35, 64.5) projected
  line L1 (-6.35, 58.15) -> (52.4716, 58.15)
  line L2 (52.4716, 58.15) -> (52.4716, 64.5)
  line L3 (52.4716, 64.5) -> (-6.35, 64.5)
  line L4 (-6.35, 64.5) -> (-6.35, 58.15)
  point P0 (3.2926, -48.55)
extrude "Extrusion23" add sketch "Sketch25" along normal blind 7.6
sketch "Sketch26" plane through (-3.2926, 5.2324, 48.55) normal (0, 1, 0) x (1, 0, 0)
  line L0 (0, -58.15) -> (0, -64.5) projected
  line L1 (52.4716, -64.5) -> (0, -64.5) projected
  line L2 (52.4716, -58.15) -> (52.4716, -64.5) projected
  line L3 (0, -58.15) -> (52.4716, -58.15) projected
  point P0 (3.2926, 48.55)
extrude "Extrusion24" add sketch "Sketch26" along normal blind 55.35
sketch "Sketch27" plane through (0, 0, 54.9) normal (0, 0, 1) x (1, 0, 0)
  line L0 (-3.2926, 36.9676) -> (-3.2926, 5.2324) projected
  line L1 (-3.2926, 5.2324) -> (-3.2926, 5) projected
  line L2 (1.7074, 0) -> (-3.2926, 5) projected
  line L3 (37.2, 0) -> (1.7074, 0) projected
  line L4 (37.2, 0) -> (42.2, 5) projected
  line L5 (42.2, 5) -> (42.2, 37.2) projected
  line L6 (42.2, 37.2) -> (37.2, 42.2) projected
  line L7 (37.2, 42.2) -> (1.7074, 42.2) projected
  line L8 (-3.2926, 37.2) -> (1.7074, 42.2) projected
  line L9 (-3.2926, 37.2) -> (-3.2926, 36.9676) projected
  circle A0 centre (5.6, 36.6) radius 1.5 projected
  circle A1 centre (36.6, 36.6) radius 1.5 projected
  circle A2 centre (36.6, 5.6) radius 1.5 projected
  circle A3 centre (5.6, 5.6) radius 1.5 projected
  circle A4 centre (21.1, 21.1) radius 16 projected
  line L10 (-3.2926, -11.2491) -> (64.8812, -11.2491)
  line L11 (64.8812, -11.2491) -> (64.8812, 73.1738)
  line L12 (64.8812, 73.1738) -> (-3.2926, 73.1738)
  line L13 (-3.2926, 73.1738) -> (-3.2926, -11.2491)
  point P0 (0, 0)
extrude "Extrusion25" cut sketch "Sketch27" along normal blind 194.15 contours L13 L12 L11 L10 L2 L3 L4 L5 L6 L7 L8 | A0 | A1 | A2 | A3
sketch "Sketch28" plane through (-3.2926, -2.3676, 113.05) normal (1, 0, 0) x (0, 0, -1)
  line L0 (6.35, 10.775) -> (6.35, 36.1602) projected
  line L1 (0, 0) -> (0, 7.3676) projected
  line L2 (6.35, 0) -> (0, 0) projected
  line L3 (6.35, 7.3676) -> (6.35, 0) projected
  line L4 (6.35, 7.3676) -> (0, 7.3676) projected
  point P0 (113.05, 2.3676)
extrude "Extrusion26" cut sketch "Sketch28" against normal blind 28.6
sketch "Sketch29" plane through (42.2, 5, 113.05) normal (1, 0, 0) x (0, 0, -1)
  line L0 (6.35, 0) -> (0, 0) projected
  line L1 (6.35, 0) -> (-3.466, 0)
  line L2 (-3.466, 0) -> (-3.466, 41.9331)
  line L3 (-3.466, 41.9331) -> (6.35, 41.9331)
  line L4 (6.35, 41.9331) -> (6.35, 0)
  line L5 (6.35, 0) -> (-14.0561, 0)
  line L6 (-14.0561, 0) -> (-14.0561, -9.0915)
  line L7 (-14.0561, -9.0915) -> (6.35, -9.0915)
  line L8 (6.35, -9.0915) -> (6.35, 0)
  point P0 (113.05, -5)
  point P1 (1.8156, 0)
extrude "Extrusion27" cut sketch "Sketch29" against normal blind 115.4
sketch "Sketch30" plane through (42.2, 5, 48.55) normal (0, 0, -1) x (-1, 0, 0)
  line L0 (59.1926, 31.9676) -> (45.4926, 31.9676) projected
  line L1 (45.4926, 31.9676) -> (45.4926, 32.2) projected
  line L2 (40.4926, 37.2) -> (45.4926, 32.2) projected
  line L3 (40.4926, 37.2) -> (5, 37.2) projected
  line L4 (0, 32.2) -> (5, 37.2) projected
  line L5 (0, 0) -> (0, 32.2) projected
  line L6 (5, -5) -> (0, 0) projected
  line L7 (5, -5) -> (40.4926, -5) projected
  line L8 (45.4926, 0) -> (40.4926, -5) projected
  line L9 (45.4926, 0) -> (45.4926, 0.2324) projected
  line L10 (45.4926, 0.2324) -> (59.1926, 0.2324) projected
  line L11 (59.1926, 28.7926) -> (59.1926, 3.4074) projected
  circle A0 centre (21.1, 16.1) radius 16 projected
  circle A1 centre (36.6, 0.6) radius 1.5 projected
  circle A2 centre (5.6, 0.6) radius 1.5 projected
  circle A3 centre (5.6, 31.6) radius 1.5 projected
  circle A4 centre (36.6, 31.6) radius 1.5 projected
  line L12 (59.1926, 28.7926) -> (59.1926, 31.9676) projected
  line L13 (59.1926, 0.2324) -> (59.1926, 3.4074) projected
  point P0 (42.2, -5)
extrude "Extrusion28" add sketch "Sketch30" along normal up to surface (12.7 mm away)
chamfer "Chamfer2" distance 8.25 angle 45 1 edges at (-16.9926, 21.1, 35.85)
chamfer "Chamfer3" distance 8.25 angle 45 1 edges at (-16.9926, 21.1, 106.7)
fillet "Fillet7" radius 5.75 5 edges at (-3.2926, 21.1, 106.7) (-42.3926, 35.3801, 106.7) (-42.3926, 6.8199, 106.7) (-42.3926, 6.8199, 35.85) (-42.3926, 35.3801, 35.85)
properties part number "Nema 17 stepper motor.2ipt"
